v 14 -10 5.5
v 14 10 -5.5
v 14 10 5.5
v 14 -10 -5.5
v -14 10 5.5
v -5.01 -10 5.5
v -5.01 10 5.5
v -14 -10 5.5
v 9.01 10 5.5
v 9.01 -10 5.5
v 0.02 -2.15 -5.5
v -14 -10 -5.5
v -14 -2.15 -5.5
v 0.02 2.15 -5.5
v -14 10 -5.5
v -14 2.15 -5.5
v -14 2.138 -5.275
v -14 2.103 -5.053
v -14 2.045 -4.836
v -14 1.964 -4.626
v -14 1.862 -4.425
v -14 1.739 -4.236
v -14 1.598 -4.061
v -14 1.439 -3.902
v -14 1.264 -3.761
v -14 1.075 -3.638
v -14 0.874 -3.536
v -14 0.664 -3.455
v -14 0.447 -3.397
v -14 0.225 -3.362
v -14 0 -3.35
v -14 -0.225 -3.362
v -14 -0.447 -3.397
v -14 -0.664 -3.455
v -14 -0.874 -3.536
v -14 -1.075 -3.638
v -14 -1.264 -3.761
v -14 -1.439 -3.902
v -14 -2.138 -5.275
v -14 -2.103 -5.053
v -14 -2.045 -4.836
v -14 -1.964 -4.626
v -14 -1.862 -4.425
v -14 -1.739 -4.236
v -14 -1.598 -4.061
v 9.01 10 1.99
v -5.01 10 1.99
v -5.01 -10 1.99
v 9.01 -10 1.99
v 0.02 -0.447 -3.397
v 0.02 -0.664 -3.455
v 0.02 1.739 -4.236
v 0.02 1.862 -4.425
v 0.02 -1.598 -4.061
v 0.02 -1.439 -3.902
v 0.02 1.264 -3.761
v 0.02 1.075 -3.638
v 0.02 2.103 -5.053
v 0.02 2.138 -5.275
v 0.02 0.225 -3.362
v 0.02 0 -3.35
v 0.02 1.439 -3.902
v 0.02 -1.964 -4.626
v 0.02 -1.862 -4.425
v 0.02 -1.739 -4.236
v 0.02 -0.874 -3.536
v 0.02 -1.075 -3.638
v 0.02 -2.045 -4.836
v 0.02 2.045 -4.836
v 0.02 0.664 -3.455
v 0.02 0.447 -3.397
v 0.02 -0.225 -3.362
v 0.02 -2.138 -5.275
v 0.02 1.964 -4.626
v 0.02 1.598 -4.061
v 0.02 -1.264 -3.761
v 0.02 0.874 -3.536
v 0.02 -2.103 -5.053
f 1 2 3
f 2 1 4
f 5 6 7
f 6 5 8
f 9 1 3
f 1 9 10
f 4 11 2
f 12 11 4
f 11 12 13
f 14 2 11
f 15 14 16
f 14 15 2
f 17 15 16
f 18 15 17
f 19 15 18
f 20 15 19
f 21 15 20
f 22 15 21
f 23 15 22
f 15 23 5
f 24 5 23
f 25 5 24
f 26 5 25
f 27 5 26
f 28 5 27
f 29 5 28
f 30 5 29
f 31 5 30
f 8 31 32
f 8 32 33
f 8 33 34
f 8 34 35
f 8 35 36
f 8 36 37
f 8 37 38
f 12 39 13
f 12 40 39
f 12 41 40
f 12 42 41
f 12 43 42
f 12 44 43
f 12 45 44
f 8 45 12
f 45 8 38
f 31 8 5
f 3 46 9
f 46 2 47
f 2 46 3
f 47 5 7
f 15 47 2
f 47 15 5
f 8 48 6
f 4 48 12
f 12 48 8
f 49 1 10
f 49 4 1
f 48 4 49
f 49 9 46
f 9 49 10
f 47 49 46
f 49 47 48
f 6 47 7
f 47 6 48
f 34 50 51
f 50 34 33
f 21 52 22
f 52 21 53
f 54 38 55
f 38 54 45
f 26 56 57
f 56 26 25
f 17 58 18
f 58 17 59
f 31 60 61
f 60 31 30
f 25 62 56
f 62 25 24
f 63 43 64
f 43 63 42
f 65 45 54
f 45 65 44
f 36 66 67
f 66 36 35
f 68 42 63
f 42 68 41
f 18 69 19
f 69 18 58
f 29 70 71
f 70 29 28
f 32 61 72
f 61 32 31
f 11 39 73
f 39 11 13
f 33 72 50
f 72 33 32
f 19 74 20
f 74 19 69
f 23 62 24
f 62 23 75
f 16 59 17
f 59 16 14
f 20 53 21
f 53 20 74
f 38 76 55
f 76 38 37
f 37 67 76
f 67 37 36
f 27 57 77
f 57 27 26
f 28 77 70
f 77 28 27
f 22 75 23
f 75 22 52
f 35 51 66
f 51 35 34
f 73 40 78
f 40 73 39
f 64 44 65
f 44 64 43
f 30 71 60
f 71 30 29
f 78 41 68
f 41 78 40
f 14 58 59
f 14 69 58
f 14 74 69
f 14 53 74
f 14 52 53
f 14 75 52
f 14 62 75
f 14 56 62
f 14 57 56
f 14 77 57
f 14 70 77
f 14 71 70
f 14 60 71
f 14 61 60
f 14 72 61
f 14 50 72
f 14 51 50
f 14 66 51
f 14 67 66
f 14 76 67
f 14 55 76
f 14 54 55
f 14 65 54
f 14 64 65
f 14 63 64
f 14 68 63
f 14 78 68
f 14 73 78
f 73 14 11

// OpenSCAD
// Snap panel clip with a U-shaped panel slot.
$fn = 60;
eps = 0.02;
panel_t = 3;
clip_w = 20;
clip_l = 28;
clip_h = panel_t + 8;
slot = panel_t + 0.5;
difference() {
    cube([clip_l,clip_w,clip_h],center=true);
    translate([2,0,clip_h/2-slot/2]) cube([clip_l/2+eps,clip_w+2*eps,slot+eps],center=true);
    translate([-clip_l/2-eps,0,-clip_h/2]) rotate([0,90,0]) cylinder(d=4.3,h=clip_l/2+2*eps);
}
